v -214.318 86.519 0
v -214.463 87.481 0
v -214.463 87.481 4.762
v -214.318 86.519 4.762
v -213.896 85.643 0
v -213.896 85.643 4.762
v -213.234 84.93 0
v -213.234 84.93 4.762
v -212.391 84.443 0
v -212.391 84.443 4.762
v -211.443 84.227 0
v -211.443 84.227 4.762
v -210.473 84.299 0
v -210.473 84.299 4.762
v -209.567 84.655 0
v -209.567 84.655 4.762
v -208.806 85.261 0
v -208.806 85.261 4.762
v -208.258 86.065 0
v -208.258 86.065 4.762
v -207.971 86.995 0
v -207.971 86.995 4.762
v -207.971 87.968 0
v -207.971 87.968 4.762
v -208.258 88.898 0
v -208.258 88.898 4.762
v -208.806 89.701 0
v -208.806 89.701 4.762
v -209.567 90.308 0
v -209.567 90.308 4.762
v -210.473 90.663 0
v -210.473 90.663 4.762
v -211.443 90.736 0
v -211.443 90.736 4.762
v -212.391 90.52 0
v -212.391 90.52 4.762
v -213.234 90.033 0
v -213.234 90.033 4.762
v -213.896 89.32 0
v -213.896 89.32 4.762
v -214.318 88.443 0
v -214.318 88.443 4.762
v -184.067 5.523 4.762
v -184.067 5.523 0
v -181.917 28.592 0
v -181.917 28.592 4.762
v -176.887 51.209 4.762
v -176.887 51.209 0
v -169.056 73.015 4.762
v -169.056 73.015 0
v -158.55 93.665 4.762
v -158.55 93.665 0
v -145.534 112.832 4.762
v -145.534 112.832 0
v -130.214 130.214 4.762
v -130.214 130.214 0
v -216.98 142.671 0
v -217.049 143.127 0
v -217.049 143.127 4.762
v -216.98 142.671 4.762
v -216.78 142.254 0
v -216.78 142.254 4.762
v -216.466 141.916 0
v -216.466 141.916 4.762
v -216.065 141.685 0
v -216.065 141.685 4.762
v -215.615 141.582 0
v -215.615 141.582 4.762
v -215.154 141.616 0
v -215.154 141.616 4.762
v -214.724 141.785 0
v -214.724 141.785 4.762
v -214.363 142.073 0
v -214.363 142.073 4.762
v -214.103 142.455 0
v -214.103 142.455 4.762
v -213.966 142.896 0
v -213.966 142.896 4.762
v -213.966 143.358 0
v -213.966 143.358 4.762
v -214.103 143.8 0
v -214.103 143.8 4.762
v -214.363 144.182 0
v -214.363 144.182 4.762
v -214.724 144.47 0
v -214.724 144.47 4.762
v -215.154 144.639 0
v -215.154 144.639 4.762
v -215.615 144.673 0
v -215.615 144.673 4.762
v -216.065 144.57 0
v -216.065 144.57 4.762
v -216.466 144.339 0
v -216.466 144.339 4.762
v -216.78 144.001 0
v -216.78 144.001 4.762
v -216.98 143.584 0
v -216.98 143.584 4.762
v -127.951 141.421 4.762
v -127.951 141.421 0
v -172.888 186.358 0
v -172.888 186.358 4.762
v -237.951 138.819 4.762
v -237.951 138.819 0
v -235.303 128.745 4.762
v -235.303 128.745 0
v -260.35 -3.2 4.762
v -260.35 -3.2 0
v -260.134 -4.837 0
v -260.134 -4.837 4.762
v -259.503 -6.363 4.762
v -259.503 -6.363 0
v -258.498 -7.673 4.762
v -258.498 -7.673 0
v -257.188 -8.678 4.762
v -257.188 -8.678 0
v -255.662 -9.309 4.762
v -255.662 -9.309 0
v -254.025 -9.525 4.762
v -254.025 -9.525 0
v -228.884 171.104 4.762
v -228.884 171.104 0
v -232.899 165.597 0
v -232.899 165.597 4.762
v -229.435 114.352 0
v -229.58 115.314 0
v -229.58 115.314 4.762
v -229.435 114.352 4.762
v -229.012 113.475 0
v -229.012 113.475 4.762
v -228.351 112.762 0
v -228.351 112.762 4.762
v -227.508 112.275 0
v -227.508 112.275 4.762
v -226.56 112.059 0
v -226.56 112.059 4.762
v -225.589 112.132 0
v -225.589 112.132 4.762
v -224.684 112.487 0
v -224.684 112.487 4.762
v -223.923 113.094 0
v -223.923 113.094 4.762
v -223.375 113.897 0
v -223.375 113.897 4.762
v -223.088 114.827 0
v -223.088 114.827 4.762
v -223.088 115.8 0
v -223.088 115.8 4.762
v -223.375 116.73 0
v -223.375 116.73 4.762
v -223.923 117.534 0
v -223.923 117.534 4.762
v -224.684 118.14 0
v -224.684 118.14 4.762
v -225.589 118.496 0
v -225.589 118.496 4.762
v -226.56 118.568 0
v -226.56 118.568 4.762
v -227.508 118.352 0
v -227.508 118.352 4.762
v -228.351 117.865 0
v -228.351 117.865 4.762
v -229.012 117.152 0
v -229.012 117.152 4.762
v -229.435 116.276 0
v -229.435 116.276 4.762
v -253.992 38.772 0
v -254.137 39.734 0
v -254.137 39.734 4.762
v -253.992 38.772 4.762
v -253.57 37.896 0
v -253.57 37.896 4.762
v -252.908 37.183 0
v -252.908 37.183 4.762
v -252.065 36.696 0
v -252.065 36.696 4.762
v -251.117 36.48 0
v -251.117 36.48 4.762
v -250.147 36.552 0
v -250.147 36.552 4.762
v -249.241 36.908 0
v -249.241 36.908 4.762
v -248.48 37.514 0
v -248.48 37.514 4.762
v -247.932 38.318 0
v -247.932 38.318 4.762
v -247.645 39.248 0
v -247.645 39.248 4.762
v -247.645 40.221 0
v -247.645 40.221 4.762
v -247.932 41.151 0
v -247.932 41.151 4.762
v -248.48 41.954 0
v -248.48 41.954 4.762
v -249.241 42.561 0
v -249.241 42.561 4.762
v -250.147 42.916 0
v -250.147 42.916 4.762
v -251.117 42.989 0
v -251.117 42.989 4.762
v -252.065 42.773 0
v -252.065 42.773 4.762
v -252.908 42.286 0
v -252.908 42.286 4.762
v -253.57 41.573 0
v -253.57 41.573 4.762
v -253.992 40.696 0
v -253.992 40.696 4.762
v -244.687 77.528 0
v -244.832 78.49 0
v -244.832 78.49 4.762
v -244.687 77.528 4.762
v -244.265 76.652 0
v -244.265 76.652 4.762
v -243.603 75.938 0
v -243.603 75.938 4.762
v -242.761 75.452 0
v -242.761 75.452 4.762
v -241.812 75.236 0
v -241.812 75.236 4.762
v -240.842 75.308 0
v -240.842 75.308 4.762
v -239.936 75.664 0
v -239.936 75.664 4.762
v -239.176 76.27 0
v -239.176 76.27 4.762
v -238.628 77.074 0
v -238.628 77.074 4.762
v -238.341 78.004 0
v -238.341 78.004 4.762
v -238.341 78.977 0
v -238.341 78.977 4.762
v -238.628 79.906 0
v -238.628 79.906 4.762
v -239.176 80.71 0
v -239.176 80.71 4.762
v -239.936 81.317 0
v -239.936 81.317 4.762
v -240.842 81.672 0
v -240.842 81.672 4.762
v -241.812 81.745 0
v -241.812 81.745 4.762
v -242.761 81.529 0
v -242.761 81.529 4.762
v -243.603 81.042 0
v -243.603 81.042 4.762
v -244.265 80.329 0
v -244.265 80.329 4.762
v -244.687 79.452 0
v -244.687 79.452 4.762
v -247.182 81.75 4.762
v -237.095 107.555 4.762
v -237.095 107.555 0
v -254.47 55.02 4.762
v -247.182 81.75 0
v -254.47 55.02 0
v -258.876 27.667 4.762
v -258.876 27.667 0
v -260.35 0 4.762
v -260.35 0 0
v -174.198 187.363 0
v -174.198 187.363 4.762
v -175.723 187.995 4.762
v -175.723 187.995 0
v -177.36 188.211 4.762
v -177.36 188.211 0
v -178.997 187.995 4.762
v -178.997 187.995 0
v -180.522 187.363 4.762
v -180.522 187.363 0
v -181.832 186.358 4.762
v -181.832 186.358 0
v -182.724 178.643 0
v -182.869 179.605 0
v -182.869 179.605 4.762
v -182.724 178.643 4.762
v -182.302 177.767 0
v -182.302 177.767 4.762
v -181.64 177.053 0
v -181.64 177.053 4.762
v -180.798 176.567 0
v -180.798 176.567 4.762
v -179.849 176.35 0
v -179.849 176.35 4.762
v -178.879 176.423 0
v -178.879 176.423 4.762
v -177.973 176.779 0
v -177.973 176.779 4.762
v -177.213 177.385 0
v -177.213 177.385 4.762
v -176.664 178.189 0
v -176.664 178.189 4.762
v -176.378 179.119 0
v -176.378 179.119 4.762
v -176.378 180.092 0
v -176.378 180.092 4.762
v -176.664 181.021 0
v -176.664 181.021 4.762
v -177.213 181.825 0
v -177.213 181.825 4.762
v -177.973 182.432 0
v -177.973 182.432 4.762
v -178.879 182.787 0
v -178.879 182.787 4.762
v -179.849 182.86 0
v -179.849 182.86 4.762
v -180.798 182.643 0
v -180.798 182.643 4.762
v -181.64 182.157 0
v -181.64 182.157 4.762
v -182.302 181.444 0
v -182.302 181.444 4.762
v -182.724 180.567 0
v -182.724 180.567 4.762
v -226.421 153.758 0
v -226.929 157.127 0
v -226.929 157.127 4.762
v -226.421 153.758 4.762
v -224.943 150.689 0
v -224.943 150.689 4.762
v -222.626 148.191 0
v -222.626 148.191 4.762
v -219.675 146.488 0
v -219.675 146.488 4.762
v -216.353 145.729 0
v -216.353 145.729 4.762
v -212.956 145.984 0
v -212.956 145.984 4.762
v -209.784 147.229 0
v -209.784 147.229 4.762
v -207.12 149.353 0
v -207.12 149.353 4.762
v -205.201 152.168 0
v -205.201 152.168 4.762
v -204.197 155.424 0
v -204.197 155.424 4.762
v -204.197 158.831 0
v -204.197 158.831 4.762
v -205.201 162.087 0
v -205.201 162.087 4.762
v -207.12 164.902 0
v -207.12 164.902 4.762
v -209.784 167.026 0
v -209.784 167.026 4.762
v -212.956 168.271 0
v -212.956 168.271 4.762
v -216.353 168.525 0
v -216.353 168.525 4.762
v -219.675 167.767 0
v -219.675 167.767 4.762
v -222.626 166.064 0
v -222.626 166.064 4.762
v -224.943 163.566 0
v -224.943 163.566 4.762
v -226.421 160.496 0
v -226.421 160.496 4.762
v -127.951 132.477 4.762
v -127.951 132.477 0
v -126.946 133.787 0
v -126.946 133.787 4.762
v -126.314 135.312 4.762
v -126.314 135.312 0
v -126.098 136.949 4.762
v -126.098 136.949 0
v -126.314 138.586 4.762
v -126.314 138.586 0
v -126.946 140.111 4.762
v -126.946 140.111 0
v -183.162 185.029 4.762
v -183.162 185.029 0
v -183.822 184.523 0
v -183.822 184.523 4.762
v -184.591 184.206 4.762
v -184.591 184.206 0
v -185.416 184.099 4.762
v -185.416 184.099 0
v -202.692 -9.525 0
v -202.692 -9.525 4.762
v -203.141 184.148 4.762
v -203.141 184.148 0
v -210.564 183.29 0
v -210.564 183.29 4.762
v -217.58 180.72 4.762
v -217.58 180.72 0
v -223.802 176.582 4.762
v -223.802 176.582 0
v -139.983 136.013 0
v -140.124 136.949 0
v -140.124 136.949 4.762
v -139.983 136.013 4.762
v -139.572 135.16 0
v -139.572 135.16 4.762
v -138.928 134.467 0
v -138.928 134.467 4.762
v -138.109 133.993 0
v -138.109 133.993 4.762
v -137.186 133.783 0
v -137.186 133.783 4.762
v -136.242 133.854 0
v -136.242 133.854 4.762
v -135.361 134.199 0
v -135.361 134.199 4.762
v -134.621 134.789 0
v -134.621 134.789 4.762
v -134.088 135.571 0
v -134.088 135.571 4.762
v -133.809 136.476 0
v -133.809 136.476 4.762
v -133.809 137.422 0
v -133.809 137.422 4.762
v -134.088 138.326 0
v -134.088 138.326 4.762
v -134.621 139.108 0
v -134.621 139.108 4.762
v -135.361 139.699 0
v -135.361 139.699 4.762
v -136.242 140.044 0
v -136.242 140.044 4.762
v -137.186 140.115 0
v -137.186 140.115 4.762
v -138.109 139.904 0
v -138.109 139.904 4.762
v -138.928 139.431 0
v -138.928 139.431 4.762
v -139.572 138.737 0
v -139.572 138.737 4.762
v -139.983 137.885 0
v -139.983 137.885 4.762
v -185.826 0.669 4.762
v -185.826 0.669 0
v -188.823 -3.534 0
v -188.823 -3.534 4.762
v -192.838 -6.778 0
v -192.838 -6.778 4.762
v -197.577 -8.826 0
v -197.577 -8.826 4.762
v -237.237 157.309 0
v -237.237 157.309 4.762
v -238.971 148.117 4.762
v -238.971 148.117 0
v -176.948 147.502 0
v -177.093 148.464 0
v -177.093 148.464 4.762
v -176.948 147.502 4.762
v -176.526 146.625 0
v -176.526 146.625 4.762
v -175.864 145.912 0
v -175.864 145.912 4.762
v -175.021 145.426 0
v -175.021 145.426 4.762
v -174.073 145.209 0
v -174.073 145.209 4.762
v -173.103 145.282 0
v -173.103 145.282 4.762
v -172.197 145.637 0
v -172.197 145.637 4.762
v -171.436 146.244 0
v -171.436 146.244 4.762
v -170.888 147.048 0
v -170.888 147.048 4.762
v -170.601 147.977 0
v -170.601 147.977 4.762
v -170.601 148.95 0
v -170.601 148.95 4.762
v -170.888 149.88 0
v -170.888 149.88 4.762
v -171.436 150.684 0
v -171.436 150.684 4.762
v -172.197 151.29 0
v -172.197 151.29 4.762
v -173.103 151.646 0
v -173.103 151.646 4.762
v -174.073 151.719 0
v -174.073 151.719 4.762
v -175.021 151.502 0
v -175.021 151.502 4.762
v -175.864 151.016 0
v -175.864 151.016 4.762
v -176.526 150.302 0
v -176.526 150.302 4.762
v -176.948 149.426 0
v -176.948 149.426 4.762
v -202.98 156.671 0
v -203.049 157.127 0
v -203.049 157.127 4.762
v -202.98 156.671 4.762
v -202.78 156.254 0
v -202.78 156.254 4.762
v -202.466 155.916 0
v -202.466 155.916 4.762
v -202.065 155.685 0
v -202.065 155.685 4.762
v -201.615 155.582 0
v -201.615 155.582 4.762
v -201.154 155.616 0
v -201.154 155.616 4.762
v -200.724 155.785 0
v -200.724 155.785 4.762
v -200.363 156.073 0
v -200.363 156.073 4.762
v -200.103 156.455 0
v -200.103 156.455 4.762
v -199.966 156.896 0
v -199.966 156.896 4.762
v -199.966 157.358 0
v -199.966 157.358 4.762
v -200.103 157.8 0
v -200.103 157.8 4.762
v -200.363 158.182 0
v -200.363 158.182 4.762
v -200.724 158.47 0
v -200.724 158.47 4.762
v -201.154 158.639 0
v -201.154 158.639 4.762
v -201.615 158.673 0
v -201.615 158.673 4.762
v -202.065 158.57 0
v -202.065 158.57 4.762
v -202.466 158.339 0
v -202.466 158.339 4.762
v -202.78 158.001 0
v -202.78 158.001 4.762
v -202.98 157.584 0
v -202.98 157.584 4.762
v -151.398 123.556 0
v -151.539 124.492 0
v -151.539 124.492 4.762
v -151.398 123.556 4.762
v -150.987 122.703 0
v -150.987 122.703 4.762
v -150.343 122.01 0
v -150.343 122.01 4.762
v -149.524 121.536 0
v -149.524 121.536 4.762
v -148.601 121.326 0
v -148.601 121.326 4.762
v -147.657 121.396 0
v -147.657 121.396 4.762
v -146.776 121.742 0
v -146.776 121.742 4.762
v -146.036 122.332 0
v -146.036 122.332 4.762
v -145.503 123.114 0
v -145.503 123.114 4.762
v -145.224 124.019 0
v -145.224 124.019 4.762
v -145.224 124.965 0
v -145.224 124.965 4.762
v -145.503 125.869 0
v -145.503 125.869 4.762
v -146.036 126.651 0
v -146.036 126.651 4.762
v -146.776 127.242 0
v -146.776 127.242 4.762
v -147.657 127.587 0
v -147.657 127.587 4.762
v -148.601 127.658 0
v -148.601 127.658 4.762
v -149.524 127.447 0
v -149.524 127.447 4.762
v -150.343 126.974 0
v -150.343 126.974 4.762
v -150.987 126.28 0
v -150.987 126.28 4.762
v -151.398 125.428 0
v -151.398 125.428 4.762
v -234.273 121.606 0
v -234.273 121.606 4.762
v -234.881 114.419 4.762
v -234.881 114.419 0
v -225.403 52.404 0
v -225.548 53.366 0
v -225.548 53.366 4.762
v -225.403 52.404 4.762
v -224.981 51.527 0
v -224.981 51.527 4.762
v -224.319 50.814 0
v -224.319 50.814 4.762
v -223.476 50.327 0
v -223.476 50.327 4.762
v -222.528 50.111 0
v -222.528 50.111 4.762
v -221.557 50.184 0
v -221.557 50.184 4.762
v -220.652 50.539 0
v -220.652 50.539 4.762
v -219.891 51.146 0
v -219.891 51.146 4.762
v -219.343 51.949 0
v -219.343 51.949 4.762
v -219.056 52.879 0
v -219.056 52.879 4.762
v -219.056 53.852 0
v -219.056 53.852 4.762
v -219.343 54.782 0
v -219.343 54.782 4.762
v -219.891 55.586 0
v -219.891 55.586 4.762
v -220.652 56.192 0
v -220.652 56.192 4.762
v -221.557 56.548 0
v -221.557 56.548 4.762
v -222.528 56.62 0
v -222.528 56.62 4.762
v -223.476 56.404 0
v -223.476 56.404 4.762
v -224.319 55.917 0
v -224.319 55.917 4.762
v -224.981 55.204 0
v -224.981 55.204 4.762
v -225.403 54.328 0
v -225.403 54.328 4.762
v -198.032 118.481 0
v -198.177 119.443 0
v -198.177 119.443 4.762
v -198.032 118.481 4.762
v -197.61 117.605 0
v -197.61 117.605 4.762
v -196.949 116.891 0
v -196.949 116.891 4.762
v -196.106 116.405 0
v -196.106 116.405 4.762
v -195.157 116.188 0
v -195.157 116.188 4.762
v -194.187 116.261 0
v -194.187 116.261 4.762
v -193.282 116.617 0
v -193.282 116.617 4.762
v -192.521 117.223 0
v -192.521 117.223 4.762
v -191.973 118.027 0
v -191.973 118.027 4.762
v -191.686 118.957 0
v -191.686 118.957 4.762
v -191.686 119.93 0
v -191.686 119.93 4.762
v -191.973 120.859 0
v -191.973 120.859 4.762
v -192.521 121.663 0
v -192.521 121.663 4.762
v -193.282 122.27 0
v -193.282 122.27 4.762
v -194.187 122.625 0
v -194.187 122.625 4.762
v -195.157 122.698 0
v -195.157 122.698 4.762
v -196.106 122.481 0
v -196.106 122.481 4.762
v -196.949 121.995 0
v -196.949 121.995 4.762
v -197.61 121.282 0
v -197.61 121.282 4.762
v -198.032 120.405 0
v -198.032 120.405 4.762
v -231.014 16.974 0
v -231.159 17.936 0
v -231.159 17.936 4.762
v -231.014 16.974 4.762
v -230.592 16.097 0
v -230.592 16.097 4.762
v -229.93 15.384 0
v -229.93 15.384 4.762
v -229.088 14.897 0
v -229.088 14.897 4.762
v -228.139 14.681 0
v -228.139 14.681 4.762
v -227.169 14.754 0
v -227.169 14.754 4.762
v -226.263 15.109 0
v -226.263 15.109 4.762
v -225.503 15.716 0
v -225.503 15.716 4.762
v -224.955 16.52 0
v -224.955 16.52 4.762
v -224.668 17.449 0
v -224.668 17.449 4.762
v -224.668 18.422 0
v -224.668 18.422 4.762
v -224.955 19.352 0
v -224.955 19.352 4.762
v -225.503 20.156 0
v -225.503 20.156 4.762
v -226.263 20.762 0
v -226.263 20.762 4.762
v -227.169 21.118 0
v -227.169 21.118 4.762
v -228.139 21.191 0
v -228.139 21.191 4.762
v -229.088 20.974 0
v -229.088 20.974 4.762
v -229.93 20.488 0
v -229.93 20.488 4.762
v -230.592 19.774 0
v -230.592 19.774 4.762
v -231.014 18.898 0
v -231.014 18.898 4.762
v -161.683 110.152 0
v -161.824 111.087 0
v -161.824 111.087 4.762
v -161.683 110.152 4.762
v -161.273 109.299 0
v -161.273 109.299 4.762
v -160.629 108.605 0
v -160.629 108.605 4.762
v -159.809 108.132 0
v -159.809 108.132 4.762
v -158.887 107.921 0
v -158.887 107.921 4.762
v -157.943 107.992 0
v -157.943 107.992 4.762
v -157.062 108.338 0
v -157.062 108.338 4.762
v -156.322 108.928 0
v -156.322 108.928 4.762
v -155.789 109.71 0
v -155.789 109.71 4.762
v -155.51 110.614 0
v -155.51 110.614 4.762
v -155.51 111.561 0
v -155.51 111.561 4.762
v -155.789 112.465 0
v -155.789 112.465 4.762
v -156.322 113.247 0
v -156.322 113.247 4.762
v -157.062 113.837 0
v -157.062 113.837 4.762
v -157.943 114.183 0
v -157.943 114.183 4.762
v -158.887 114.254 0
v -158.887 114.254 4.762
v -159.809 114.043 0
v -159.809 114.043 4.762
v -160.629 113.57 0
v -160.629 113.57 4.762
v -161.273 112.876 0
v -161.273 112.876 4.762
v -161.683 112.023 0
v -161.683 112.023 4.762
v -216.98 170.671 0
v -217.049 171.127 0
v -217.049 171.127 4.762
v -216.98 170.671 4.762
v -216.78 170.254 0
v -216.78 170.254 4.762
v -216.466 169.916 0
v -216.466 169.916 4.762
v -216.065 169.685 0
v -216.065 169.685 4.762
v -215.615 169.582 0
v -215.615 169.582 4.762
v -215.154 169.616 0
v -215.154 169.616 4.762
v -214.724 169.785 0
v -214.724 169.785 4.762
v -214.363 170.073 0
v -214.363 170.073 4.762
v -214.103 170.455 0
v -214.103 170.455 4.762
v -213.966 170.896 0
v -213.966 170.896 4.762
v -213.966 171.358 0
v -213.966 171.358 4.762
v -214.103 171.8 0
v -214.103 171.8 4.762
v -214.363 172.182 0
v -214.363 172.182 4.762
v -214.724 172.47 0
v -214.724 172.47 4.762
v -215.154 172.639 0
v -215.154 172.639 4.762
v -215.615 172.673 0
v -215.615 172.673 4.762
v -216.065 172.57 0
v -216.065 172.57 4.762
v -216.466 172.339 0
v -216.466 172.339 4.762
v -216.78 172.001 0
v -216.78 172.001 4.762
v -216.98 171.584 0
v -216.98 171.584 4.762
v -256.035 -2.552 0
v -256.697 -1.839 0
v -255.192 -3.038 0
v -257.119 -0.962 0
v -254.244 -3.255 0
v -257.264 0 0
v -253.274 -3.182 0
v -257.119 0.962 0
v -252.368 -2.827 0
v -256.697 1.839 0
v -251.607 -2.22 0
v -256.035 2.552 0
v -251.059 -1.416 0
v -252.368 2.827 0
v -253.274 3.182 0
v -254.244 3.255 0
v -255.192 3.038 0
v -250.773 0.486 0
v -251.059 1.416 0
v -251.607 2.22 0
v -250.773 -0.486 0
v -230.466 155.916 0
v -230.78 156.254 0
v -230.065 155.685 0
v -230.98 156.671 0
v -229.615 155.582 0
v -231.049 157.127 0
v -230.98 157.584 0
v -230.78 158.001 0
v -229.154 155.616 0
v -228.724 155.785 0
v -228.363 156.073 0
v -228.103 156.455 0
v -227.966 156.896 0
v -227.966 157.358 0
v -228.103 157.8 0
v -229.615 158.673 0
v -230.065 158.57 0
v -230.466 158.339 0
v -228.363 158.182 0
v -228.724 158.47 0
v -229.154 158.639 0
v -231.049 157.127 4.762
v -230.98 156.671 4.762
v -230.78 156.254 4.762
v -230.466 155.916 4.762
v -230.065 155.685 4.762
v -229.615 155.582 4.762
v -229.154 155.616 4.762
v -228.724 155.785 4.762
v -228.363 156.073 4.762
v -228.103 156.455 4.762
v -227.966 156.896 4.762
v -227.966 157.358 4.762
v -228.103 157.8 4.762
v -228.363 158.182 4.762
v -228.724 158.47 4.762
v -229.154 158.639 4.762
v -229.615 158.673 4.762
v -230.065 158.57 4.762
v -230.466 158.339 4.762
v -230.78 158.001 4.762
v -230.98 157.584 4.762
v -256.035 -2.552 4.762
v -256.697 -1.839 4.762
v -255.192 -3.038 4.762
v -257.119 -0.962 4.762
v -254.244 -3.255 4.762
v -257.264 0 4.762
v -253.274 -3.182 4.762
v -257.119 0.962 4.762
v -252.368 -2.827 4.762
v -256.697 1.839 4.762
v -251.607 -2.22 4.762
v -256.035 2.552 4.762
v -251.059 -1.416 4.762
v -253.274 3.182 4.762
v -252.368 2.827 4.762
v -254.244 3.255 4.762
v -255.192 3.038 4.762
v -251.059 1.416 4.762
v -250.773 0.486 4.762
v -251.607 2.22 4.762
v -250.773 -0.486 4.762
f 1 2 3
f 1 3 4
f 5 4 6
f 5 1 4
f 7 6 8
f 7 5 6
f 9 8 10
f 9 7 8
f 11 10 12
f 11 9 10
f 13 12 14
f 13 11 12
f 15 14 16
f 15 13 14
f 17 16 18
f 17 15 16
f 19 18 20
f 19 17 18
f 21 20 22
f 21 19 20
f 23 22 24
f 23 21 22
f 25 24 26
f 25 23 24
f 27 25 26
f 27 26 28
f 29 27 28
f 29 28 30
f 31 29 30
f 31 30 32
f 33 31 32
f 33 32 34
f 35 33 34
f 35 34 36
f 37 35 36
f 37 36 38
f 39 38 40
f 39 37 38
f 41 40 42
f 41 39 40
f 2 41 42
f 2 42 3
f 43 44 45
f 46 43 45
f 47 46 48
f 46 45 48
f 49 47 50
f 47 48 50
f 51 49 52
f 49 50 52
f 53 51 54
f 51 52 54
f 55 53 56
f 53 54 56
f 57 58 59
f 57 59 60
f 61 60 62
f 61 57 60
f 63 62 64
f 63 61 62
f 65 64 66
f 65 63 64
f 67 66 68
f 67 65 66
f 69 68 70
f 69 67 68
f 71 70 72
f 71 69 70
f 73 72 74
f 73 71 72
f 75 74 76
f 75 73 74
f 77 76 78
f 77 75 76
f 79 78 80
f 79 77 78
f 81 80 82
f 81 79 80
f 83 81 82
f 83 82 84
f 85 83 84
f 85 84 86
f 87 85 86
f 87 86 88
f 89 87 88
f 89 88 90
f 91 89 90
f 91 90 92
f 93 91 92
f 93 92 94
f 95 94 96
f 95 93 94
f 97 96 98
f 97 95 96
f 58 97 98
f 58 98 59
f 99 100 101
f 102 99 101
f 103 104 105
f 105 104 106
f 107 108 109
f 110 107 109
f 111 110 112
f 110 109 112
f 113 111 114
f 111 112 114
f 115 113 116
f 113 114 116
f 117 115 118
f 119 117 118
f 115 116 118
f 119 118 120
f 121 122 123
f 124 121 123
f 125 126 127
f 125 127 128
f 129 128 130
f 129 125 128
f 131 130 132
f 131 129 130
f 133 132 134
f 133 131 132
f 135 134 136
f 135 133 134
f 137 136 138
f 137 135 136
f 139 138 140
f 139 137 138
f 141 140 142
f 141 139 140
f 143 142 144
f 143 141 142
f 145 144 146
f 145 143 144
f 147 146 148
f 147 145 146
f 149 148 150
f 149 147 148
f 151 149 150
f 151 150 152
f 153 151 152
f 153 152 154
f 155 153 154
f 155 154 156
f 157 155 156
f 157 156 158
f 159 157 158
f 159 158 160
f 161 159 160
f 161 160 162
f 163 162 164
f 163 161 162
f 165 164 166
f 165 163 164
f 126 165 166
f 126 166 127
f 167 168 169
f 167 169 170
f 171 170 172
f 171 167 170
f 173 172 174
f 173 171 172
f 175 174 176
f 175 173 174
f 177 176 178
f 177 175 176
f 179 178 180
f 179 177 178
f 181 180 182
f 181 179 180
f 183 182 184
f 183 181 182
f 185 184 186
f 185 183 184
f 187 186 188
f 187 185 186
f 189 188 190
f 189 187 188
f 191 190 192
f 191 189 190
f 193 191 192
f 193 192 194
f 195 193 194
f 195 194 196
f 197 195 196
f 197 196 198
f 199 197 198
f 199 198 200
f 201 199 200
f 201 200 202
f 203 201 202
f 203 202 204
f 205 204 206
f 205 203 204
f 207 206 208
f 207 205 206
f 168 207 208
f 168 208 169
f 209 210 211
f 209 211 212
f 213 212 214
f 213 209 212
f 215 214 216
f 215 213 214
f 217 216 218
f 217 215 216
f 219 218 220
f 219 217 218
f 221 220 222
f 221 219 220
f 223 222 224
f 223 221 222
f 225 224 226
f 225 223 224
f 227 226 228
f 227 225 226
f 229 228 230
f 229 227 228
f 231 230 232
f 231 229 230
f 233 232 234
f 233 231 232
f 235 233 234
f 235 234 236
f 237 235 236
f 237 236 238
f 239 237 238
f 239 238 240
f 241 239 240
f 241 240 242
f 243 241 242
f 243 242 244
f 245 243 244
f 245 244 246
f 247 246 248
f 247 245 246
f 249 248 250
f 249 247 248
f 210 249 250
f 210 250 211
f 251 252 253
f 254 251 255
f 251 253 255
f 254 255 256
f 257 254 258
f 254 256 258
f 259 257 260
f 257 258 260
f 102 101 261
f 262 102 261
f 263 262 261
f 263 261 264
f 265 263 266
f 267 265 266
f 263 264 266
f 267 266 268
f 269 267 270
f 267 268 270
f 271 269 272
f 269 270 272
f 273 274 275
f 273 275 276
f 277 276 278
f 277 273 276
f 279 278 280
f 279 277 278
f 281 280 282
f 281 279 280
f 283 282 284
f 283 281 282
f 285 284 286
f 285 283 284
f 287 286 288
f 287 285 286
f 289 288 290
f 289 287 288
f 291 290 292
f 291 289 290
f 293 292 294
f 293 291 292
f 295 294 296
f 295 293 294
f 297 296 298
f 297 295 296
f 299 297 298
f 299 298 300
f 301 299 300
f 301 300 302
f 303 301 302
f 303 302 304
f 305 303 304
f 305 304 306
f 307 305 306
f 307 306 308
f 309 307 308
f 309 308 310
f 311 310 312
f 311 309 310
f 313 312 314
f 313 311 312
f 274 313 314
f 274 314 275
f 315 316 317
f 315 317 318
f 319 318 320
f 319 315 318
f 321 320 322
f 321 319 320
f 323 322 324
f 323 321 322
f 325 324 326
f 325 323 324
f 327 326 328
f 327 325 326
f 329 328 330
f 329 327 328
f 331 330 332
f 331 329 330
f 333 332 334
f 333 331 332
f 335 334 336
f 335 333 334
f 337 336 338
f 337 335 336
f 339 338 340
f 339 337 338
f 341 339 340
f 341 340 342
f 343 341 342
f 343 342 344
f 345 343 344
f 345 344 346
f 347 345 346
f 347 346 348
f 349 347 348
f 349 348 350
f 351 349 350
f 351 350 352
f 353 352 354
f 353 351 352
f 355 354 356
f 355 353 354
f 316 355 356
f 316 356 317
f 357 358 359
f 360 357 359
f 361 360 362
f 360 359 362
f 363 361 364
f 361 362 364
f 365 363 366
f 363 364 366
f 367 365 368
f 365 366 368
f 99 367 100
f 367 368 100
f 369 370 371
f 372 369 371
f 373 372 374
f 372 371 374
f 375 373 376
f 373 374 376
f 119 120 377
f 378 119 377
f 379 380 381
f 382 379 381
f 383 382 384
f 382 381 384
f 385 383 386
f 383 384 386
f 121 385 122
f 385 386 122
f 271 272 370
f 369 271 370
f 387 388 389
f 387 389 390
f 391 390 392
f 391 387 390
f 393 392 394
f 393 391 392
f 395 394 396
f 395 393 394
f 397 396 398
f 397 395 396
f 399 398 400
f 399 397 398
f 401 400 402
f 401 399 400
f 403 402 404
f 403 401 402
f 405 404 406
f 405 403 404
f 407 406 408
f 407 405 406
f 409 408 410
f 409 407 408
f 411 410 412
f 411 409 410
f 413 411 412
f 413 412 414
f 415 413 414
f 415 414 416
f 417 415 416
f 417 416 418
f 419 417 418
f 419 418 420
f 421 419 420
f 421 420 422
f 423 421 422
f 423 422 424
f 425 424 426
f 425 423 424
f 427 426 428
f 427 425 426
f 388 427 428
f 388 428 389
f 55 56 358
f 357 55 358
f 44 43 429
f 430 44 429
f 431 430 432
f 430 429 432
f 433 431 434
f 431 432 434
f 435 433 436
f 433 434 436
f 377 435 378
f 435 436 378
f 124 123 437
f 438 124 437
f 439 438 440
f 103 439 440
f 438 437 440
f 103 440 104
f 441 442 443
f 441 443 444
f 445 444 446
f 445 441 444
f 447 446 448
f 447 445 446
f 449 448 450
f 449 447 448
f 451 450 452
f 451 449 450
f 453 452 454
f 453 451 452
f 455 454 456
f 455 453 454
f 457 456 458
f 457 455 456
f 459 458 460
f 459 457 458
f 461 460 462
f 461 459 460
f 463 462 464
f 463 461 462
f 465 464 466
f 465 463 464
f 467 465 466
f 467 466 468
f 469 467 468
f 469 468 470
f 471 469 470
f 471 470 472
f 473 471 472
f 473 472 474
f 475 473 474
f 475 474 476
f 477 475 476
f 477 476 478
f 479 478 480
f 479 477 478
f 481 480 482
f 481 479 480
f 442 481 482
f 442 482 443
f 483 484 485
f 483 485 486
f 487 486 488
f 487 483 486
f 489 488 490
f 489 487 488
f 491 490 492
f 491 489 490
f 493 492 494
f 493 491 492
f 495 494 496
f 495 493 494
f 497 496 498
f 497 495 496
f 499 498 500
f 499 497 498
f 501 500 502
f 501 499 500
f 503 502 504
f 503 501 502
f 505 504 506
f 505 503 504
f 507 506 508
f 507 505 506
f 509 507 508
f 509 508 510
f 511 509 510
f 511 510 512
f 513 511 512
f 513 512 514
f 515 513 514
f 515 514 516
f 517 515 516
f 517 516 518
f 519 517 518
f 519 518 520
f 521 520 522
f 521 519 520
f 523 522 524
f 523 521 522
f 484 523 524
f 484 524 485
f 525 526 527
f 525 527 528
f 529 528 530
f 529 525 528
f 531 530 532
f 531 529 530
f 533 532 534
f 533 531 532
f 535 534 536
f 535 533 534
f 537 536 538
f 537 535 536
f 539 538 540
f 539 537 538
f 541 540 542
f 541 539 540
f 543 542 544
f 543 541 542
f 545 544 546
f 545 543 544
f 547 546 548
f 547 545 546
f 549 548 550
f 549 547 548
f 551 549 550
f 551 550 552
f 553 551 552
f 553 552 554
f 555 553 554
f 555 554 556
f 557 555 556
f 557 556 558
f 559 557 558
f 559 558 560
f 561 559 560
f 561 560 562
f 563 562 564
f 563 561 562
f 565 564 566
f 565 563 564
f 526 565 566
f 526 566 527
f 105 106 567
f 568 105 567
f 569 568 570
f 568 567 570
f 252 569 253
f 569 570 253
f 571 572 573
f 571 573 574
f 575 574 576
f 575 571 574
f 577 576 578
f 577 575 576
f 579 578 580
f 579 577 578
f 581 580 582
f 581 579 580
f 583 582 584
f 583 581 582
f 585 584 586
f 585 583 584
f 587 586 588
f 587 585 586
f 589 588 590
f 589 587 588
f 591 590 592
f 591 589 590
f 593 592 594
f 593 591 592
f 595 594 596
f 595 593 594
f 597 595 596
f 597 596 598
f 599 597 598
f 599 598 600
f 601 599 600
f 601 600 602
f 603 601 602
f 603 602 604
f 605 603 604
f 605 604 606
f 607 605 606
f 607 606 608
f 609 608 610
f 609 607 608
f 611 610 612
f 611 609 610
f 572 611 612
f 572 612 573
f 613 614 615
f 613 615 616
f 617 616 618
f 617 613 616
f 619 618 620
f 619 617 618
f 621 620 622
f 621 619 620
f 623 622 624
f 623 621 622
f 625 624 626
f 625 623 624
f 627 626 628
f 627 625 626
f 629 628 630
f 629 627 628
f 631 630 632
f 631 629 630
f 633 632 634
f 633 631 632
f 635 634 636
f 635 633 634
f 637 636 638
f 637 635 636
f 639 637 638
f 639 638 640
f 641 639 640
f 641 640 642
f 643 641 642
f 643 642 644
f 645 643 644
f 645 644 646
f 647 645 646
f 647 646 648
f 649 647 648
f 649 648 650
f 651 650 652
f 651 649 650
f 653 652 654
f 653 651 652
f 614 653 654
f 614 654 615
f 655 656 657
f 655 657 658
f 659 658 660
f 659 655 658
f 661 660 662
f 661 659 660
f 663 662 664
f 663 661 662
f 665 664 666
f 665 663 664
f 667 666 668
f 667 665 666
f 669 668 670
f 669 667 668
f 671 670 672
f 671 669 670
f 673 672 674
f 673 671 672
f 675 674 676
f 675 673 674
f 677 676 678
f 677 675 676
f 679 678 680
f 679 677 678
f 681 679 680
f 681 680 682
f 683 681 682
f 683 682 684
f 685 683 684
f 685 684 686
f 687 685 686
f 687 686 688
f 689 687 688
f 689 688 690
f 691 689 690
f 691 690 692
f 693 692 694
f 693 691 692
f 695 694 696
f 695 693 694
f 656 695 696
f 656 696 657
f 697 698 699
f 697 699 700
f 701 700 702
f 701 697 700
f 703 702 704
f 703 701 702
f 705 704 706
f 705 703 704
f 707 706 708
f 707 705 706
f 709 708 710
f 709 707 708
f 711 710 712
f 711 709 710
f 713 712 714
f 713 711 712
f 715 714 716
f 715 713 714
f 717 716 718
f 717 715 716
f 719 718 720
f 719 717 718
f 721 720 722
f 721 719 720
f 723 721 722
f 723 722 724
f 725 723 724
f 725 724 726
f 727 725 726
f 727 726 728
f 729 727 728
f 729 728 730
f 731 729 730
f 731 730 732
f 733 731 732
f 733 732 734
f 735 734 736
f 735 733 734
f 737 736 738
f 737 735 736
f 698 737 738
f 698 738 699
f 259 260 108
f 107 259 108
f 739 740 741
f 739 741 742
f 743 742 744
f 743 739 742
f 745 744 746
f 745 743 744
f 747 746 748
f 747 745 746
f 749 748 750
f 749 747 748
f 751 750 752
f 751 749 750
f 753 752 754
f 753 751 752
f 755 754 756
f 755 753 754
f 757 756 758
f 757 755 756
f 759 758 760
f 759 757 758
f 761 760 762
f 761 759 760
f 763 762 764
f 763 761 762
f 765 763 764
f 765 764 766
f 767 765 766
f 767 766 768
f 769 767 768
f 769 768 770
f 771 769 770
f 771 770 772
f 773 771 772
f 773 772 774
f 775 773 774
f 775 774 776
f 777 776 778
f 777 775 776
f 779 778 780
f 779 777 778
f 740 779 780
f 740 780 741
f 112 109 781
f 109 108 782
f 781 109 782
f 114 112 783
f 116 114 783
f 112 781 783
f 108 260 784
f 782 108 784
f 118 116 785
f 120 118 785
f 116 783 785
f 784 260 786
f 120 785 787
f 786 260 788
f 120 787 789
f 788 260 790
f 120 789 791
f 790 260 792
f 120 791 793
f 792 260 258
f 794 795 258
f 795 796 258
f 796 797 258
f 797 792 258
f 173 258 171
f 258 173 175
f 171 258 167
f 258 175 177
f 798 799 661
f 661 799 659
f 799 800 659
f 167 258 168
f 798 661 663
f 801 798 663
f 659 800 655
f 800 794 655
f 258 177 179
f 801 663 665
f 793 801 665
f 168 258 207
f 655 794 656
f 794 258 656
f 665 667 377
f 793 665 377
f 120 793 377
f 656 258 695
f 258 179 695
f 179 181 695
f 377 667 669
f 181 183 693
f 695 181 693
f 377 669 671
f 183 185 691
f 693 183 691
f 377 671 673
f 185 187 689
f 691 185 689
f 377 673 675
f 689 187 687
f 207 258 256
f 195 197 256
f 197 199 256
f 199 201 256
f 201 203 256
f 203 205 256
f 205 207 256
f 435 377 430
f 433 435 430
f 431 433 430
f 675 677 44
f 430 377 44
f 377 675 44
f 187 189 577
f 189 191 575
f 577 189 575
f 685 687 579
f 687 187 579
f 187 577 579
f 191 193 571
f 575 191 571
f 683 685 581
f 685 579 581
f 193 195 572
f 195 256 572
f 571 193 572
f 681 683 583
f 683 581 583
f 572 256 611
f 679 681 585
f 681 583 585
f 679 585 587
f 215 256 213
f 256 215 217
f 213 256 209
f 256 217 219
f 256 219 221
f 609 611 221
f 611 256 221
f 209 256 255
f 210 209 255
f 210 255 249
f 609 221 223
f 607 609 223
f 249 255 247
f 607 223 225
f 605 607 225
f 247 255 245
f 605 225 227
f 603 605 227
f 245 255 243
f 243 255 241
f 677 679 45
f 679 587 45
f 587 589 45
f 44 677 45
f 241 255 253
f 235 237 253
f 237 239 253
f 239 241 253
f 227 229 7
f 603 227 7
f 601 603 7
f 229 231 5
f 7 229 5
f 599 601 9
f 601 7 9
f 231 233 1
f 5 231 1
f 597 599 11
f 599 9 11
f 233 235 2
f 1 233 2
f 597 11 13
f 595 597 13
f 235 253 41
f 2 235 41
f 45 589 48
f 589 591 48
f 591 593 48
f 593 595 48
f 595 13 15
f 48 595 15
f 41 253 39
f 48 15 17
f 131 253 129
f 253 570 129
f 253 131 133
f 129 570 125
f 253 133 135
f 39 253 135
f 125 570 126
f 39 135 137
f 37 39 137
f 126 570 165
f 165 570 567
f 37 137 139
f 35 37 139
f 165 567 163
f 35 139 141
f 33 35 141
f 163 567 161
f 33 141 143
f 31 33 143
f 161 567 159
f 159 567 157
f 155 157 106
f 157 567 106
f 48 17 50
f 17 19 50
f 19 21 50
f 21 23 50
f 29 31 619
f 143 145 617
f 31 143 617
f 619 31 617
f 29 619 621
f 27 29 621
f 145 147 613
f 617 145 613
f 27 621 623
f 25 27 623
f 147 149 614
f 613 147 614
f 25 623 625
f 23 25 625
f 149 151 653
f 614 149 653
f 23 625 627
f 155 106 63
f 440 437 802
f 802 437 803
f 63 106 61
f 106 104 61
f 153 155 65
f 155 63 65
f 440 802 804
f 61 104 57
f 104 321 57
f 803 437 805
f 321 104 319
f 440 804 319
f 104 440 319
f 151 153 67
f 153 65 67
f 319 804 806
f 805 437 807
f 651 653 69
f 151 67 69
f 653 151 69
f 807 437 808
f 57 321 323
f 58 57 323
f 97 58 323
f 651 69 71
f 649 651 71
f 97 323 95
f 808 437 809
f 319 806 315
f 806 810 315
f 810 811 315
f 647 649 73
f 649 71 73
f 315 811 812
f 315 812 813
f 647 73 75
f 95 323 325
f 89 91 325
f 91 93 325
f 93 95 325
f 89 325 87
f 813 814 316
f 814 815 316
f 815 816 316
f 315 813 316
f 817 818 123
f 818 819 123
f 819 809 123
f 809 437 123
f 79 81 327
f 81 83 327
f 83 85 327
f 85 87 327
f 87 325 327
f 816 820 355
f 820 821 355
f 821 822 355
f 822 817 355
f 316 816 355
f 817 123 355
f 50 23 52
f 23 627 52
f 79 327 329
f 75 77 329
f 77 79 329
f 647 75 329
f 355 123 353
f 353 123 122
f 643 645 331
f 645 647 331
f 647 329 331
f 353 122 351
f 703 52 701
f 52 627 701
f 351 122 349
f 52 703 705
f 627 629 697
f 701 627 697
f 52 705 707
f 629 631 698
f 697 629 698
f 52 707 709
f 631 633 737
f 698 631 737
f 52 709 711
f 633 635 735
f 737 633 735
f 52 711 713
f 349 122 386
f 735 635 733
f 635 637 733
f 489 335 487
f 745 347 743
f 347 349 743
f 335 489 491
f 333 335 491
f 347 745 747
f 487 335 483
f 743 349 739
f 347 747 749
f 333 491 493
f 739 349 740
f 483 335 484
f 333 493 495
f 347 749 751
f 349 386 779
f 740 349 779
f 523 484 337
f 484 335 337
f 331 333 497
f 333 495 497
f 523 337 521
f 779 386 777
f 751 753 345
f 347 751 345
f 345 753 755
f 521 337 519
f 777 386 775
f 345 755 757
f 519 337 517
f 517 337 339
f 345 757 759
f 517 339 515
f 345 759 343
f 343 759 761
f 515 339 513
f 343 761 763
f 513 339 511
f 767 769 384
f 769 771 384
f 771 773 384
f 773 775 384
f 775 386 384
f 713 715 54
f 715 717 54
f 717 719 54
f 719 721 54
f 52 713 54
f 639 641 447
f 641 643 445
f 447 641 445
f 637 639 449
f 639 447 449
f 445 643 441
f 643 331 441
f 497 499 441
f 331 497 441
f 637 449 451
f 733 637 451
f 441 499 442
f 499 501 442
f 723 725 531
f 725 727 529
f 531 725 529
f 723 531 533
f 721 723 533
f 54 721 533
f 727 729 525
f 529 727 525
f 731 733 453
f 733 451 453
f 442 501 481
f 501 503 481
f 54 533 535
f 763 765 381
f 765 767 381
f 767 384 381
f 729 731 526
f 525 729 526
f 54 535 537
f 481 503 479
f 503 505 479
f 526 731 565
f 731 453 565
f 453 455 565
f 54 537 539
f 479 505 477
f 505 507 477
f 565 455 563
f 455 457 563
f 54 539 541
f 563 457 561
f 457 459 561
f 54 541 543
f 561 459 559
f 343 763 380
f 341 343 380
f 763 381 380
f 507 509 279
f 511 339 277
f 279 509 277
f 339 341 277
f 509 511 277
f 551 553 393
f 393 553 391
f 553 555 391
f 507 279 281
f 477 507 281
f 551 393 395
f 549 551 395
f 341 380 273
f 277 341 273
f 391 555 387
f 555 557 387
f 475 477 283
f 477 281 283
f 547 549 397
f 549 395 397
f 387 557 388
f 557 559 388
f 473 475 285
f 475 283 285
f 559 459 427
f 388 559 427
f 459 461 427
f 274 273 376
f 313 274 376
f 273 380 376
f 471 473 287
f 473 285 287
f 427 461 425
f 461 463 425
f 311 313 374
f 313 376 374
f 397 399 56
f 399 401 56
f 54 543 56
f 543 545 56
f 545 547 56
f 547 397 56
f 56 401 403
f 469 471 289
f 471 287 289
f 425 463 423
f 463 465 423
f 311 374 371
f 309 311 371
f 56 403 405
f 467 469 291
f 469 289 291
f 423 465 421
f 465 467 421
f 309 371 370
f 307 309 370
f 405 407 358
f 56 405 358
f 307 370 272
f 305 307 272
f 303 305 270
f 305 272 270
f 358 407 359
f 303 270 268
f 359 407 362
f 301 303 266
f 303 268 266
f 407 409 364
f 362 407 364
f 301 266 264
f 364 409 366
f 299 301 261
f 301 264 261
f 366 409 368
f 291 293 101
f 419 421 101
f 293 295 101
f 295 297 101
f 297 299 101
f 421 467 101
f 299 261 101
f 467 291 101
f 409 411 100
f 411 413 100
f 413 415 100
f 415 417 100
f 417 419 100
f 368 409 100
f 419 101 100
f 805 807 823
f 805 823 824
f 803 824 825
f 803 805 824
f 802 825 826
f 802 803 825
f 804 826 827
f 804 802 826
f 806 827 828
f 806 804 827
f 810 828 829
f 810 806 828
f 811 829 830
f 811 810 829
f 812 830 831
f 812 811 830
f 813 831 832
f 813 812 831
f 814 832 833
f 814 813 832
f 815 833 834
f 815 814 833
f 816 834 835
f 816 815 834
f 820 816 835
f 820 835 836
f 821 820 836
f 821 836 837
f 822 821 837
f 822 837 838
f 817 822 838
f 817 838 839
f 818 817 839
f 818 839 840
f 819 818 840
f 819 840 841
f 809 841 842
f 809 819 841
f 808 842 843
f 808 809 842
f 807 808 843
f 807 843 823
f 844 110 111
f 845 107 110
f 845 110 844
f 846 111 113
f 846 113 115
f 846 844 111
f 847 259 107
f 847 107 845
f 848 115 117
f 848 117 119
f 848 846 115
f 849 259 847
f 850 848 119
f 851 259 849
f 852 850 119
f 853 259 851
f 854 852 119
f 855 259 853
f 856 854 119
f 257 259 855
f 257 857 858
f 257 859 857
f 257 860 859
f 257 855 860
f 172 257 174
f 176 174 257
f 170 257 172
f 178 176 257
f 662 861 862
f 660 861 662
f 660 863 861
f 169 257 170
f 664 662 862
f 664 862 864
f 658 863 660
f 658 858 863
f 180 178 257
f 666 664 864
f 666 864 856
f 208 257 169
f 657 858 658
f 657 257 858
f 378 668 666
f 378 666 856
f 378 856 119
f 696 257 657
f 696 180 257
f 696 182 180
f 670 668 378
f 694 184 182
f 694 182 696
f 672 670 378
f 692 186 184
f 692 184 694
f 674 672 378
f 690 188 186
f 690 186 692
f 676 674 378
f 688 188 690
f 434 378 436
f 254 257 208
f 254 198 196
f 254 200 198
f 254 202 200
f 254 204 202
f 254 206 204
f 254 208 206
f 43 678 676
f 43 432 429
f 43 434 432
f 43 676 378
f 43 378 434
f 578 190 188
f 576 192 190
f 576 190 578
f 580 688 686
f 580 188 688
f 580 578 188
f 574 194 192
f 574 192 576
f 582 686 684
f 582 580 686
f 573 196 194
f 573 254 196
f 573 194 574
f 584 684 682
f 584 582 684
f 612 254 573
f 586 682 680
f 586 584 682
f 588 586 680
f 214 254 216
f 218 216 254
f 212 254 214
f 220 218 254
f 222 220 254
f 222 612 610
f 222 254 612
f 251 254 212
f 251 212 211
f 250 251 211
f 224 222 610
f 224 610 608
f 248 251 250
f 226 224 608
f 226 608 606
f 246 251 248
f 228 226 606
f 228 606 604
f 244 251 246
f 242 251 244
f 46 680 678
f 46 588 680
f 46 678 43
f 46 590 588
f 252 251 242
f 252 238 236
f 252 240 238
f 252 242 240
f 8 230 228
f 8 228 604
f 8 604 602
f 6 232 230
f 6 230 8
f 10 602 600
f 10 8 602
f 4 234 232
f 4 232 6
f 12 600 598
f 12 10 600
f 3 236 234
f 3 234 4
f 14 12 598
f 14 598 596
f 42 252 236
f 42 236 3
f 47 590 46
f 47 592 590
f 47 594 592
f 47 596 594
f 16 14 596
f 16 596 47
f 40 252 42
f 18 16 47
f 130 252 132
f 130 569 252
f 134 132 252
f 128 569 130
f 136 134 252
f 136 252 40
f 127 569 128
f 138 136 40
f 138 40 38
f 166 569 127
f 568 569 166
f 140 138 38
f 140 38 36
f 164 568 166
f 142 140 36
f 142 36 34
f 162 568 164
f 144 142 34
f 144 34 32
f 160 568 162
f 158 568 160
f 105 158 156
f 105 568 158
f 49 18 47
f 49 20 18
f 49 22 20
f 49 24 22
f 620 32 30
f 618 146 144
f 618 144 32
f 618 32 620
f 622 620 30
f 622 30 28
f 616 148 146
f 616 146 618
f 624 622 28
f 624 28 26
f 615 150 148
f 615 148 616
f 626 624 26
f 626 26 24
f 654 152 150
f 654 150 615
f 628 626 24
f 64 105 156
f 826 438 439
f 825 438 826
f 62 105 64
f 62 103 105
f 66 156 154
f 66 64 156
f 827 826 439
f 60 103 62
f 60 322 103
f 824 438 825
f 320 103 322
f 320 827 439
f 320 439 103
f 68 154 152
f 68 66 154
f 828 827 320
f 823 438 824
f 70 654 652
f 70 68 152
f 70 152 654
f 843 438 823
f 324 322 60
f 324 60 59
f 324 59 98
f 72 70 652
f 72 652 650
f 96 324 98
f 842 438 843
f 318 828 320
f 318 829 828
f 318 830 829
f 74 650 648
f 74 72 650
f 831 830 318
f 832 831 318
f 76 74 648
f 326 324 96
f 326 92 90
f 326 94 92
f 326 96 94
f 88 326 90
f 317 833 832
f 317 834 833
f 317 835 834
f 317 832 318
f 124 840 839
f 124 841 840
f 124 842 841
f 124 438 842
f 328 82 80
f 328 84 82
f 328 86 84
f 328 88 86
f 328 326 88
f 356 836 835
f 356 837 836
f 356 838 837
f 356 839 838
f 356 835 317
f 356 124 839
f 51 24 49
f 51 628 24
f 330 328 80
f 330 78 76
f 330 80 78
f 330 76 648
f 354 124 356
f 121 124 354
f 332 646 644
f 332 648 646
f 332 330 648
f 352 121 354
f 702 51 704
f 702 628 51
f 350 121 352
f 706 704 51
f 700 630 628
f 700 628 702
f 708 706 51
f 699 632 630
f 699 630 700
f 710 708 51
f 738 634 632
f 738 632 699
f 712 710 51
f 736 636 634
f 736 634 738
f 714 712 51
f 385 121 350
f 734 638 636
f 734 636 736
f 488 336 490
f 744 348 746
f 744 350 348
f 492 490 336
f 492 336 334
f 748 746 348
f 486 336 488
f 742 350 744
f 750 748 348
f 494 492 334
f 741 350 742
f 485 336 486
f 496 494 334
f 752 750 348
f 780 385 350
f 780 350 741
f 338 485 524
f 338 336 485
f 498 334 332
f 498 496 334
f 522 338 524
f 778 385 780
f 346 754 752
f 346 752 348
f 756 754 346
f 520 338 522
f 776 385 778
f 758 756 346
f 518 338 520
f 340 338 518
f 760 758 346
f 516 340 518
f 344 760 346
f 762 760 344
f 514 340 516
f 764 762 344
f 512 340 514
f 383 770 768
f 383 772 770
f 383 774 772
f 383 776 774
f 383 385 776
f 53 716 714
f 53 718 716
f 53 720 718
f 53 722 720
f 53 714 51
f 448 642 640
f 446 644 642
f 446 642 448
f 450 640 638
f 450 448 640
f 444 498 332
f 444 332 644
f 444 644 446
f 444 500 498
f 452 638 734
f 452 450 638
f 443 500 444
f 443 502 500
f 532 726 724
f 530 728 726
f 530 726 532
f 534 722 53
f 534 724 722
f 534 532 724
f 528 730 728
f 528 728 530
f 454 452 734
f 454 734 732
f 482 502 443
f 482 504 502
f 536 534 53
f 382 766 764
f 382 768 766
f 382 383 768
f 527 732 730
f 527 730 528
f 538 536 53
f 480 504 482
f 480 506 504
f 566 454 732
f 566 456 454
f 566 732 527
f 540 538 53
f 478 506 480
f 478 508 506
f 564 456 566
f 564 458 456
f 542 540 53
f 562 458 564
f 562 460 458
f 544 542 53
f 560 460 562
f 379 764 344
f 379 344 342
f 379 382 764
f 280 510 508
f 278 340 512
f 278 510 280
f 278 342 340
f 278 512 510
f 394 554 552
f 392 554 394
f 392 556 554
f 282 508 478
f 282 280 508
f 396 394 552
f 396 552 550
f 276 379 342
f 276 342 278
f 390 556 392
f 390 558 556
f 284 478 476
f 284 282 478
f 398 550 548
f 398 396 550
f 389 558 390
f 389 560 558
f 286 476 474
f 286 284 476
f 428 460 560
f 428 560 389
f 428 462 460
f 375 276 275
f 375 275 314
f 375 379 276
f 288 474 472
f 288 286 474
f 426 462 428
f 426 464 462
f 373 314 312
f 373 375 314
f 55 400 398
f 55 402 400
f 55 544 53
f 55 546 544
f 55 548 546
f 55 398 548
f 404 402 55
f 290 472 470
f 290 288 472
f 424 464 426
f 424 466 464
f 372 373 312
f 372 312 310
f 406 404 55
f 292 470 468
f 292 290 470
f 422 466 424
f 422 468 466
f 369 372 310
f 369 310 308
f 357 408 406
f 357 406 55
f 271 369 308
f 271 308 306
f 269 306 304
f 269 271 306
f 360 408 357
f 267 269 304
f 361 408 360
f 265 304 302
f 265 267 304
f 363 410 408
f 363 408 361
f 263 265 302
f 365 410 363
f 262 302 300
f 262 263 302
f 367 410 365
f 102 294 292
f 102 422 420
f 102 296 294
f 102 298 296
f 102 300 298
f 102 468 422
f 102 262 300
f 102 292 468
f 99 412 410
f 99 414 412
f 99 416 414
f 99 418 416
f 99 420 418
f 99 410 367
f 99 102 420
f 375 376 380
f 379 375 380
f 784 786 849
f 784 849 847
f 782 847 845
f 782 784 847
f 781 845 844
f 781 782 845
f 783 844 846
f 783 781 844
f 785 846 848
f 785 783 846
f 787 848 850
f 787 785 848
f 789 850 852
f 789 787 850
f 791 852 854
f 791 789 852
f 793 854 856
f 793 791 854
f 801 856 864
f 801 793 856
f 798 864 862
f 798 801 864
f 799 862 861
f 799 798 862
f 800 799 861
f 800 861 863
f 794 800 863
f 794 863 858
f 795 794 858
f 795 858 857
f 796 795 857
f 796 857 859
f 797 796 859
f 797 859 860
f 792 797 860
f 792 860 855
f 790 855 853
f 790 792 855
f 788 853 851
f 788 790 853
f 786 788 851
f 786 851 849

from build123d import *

# Parameters (mm, degrees)
SKETCH1_R           = 3.175
SKETCH1_R_2         = 3.2639
SKETCH1_R_3         = 1.55
SKETCH1_R_4         = 11.43
BOSS_EXTRUDE1_DEPTH = 4.7625
CUT_EXTRUDE1_DEPTH  = 322.291260875


with BuildPart() as part:
    # Sketch1 → Boss-Extrude1 (new body)
    with BuildSketch(Plane.XY):
        with BuildLine():
            Line((-260.35, 0), (-260.35, -3.2004))
            ThreePointArc((-260.35, -3.2004), (-258.497567548, -7.672567548), (-254.0254, -9.525))
            Line((-254.0254, -9.525), (-190.4746, -9.525))
            ThreePointArc((-190.4746, -9.525), (-186.002432452, -7.672567548), (-184.15, -3.2004))
            Line((-184.15, -3.2004), (-184.15, 0))
            ThreePointArc((-184.15, 0), (-170.132415912, 70.47115407), (-130.213713756, 130.213713756))
            Line((-130.213713756, 130.213713756), (-127.950689213, 132.476738298))
            ThreePointArc((-127.950689213, 132.476738298), (-126.098256761, 136.948905846), (-127.950689213, 141.421073395))
            Line((-127.950689213, 141.421073395), (-172.887890843, 186.358275024))
            ThreePointArc((-172.887890843, 186.358275024), (-177.360058391, 188.210707476), (-181.832225939, 186.358275024))
            Line((-181.832225939, 186.358275024), (-183.161638698, 185.028862266))
            ThreePointArc((-183.161638698, 185.028862266), (-184.195780986, 184.338914621), (-185.415571777, 184.098938684))
            Line((-185.415571777, 184.098938684), (-203.140946764, 184.148452962))
            ThreePointArc((-203.140946764, 184.148452962), (-217.580337842, 180.720298054), (-228.884291539, 171.104223407))
            Line((-228.884291539, 171.104223407), (-232.899485557, 165.597414859))
            ThreePointArc((-232.899485557, 165.597414859), (-238.444512868, 152.777545082), (-237.951278447, 138.818565579))
            Line((-237.951278447, 138.818565579), (-235.302655594, 128.744521776))
            ThreePointArc((-235.302655594, 128.744521776), (-234.372087536, 117.99517122), (-237.095069858, 107.554871341))
            ThreePointArc((-237.095069858, 107.554871341), (-254.469864559, 55.020092069), (-260.35, 0))
        make_face()
        with Locations(Location((-158.649272178, 111.08741631, 0), (0, 0, 180))):
            Circle(SKETCH1_R, mode=Mode.SUBTRACT)
        with Locations(Location((-148.363657521, 124.491890306, 0), (0, 0, 180))):
            Circle(SKETCH1_R, mode=Mode.SUBTRACT)
        with Locations(Location((-136.948905846, 136.948905846, 0), (0, 0, 180))):
            Circle(SKETCH1_R, mode=Mode.SUBTRACT)
        with Locations(Location((-227.895302491, 17.935749283, 0), (0, 0, 180))):
            Circle(SKETCH1_R_2, mode=Mode.SUBTRACT)
        with Locations(Location((-222.283763803, 53.365610177, 0), (0, 0, 180))):
            Circle(SKETCH1_R_2, mode=Mode.SUBTRACT)
        with Locations(Location((-211.198861132, 87.481432639, 0), (0, 0, 180))):
            Circle(SKETCH1_R_2, mode=Mode.SUBTRACT)
        with Locations(Location((-194.913541571, 119.443171894, 0), (0, 0, 180))):
            Circle(SKETCH1_R_2, mode=Mode.SUBTRACT)
        with Locations(Location((-173.828803736, 148.463823848, 0), (0, 0, 180))):
            Circle(SKETCH1_R_2, mode=Mode.SUBTRACT)
        with Locations(Location((-215.499095978, 171.127431131, 0), (0, 0, 180))):
            Circle(SKETCH1_R_3, mode=Mode.SUBTRACT)
        with Locations(Location((-201.499096038, 157.127431191, 0), (0, 0, 180))):
            Circle(SKETCH1_R_3, mode=Mode.SUBTRACT)
        with Locations(Location((-215.499095978, 143.127431251, 0), (0, 0, 180))):
            Circle(SKETCH1_R_3, mode=Mode.SUBTRACT)
        with Locations(Location((-229.499095918, 157.127431191, 0), (0, 0, 180))):
            Circle(SKETCH1_R_3, mode=Mode.SUBTRACT)
        with Locations(Location((-215.499095978, 157.127431191, 0), (0, 0, 180))):
            Circle(SKETCH1_R_4, mode=Mode.SUBTRACT)
        with Locations(Location((-254, 0, 0), (0, 0, 180))):
            Circle(SKETCH1_R_2, mode=Mode.SUBTRACT)
        with Locations(Location((-250.872838511, 39.73435412, 0), (0, 0, 180))):
            Circle(SKETCH1_R_2, mode=Mode.SUBTRACT)
        with Locations(Location((-241.568355139, 78.490316571, 0), (0, 0, 180))):
            Circle(SKETCH1_R_2, mode=Mode.SUBTRACT)
        with Locations(Location((-226.315657144, 115.313586934, 0), (0, 0, 180))):
            Circle(SKETCH1_R_2, mode=Mode.SUBTRACT)
        with Locations(Location((-179.605122421, 179.605122421, 0), (0, 0, 180))):
            Circle(SKETCH1_R_2, mode=Mode.SUBTRACT)
    extrude(amount=BOSS_EXTRUDE1_DEPTH)

    # Sketch2 → Cut-Extrude1 (cut, through all)
    with BuildSketch(Plane.XY.offset(4.7625)):
        with BuildLine():
            Line((-202.692, -9.525), (-183.642, -9.525))
            Line((-183.642, -9.525), (-183.642, 9.525))
            ThreePointArc((-183.642, 9.525), (-189.221615818, -3.945384182), (-202.692, -9.525))
        make_face()
    extrude(amount=-CUT_EXTRUDE1_DEPTH, mode=Mode.SUBTRACT)


solid = part.part
